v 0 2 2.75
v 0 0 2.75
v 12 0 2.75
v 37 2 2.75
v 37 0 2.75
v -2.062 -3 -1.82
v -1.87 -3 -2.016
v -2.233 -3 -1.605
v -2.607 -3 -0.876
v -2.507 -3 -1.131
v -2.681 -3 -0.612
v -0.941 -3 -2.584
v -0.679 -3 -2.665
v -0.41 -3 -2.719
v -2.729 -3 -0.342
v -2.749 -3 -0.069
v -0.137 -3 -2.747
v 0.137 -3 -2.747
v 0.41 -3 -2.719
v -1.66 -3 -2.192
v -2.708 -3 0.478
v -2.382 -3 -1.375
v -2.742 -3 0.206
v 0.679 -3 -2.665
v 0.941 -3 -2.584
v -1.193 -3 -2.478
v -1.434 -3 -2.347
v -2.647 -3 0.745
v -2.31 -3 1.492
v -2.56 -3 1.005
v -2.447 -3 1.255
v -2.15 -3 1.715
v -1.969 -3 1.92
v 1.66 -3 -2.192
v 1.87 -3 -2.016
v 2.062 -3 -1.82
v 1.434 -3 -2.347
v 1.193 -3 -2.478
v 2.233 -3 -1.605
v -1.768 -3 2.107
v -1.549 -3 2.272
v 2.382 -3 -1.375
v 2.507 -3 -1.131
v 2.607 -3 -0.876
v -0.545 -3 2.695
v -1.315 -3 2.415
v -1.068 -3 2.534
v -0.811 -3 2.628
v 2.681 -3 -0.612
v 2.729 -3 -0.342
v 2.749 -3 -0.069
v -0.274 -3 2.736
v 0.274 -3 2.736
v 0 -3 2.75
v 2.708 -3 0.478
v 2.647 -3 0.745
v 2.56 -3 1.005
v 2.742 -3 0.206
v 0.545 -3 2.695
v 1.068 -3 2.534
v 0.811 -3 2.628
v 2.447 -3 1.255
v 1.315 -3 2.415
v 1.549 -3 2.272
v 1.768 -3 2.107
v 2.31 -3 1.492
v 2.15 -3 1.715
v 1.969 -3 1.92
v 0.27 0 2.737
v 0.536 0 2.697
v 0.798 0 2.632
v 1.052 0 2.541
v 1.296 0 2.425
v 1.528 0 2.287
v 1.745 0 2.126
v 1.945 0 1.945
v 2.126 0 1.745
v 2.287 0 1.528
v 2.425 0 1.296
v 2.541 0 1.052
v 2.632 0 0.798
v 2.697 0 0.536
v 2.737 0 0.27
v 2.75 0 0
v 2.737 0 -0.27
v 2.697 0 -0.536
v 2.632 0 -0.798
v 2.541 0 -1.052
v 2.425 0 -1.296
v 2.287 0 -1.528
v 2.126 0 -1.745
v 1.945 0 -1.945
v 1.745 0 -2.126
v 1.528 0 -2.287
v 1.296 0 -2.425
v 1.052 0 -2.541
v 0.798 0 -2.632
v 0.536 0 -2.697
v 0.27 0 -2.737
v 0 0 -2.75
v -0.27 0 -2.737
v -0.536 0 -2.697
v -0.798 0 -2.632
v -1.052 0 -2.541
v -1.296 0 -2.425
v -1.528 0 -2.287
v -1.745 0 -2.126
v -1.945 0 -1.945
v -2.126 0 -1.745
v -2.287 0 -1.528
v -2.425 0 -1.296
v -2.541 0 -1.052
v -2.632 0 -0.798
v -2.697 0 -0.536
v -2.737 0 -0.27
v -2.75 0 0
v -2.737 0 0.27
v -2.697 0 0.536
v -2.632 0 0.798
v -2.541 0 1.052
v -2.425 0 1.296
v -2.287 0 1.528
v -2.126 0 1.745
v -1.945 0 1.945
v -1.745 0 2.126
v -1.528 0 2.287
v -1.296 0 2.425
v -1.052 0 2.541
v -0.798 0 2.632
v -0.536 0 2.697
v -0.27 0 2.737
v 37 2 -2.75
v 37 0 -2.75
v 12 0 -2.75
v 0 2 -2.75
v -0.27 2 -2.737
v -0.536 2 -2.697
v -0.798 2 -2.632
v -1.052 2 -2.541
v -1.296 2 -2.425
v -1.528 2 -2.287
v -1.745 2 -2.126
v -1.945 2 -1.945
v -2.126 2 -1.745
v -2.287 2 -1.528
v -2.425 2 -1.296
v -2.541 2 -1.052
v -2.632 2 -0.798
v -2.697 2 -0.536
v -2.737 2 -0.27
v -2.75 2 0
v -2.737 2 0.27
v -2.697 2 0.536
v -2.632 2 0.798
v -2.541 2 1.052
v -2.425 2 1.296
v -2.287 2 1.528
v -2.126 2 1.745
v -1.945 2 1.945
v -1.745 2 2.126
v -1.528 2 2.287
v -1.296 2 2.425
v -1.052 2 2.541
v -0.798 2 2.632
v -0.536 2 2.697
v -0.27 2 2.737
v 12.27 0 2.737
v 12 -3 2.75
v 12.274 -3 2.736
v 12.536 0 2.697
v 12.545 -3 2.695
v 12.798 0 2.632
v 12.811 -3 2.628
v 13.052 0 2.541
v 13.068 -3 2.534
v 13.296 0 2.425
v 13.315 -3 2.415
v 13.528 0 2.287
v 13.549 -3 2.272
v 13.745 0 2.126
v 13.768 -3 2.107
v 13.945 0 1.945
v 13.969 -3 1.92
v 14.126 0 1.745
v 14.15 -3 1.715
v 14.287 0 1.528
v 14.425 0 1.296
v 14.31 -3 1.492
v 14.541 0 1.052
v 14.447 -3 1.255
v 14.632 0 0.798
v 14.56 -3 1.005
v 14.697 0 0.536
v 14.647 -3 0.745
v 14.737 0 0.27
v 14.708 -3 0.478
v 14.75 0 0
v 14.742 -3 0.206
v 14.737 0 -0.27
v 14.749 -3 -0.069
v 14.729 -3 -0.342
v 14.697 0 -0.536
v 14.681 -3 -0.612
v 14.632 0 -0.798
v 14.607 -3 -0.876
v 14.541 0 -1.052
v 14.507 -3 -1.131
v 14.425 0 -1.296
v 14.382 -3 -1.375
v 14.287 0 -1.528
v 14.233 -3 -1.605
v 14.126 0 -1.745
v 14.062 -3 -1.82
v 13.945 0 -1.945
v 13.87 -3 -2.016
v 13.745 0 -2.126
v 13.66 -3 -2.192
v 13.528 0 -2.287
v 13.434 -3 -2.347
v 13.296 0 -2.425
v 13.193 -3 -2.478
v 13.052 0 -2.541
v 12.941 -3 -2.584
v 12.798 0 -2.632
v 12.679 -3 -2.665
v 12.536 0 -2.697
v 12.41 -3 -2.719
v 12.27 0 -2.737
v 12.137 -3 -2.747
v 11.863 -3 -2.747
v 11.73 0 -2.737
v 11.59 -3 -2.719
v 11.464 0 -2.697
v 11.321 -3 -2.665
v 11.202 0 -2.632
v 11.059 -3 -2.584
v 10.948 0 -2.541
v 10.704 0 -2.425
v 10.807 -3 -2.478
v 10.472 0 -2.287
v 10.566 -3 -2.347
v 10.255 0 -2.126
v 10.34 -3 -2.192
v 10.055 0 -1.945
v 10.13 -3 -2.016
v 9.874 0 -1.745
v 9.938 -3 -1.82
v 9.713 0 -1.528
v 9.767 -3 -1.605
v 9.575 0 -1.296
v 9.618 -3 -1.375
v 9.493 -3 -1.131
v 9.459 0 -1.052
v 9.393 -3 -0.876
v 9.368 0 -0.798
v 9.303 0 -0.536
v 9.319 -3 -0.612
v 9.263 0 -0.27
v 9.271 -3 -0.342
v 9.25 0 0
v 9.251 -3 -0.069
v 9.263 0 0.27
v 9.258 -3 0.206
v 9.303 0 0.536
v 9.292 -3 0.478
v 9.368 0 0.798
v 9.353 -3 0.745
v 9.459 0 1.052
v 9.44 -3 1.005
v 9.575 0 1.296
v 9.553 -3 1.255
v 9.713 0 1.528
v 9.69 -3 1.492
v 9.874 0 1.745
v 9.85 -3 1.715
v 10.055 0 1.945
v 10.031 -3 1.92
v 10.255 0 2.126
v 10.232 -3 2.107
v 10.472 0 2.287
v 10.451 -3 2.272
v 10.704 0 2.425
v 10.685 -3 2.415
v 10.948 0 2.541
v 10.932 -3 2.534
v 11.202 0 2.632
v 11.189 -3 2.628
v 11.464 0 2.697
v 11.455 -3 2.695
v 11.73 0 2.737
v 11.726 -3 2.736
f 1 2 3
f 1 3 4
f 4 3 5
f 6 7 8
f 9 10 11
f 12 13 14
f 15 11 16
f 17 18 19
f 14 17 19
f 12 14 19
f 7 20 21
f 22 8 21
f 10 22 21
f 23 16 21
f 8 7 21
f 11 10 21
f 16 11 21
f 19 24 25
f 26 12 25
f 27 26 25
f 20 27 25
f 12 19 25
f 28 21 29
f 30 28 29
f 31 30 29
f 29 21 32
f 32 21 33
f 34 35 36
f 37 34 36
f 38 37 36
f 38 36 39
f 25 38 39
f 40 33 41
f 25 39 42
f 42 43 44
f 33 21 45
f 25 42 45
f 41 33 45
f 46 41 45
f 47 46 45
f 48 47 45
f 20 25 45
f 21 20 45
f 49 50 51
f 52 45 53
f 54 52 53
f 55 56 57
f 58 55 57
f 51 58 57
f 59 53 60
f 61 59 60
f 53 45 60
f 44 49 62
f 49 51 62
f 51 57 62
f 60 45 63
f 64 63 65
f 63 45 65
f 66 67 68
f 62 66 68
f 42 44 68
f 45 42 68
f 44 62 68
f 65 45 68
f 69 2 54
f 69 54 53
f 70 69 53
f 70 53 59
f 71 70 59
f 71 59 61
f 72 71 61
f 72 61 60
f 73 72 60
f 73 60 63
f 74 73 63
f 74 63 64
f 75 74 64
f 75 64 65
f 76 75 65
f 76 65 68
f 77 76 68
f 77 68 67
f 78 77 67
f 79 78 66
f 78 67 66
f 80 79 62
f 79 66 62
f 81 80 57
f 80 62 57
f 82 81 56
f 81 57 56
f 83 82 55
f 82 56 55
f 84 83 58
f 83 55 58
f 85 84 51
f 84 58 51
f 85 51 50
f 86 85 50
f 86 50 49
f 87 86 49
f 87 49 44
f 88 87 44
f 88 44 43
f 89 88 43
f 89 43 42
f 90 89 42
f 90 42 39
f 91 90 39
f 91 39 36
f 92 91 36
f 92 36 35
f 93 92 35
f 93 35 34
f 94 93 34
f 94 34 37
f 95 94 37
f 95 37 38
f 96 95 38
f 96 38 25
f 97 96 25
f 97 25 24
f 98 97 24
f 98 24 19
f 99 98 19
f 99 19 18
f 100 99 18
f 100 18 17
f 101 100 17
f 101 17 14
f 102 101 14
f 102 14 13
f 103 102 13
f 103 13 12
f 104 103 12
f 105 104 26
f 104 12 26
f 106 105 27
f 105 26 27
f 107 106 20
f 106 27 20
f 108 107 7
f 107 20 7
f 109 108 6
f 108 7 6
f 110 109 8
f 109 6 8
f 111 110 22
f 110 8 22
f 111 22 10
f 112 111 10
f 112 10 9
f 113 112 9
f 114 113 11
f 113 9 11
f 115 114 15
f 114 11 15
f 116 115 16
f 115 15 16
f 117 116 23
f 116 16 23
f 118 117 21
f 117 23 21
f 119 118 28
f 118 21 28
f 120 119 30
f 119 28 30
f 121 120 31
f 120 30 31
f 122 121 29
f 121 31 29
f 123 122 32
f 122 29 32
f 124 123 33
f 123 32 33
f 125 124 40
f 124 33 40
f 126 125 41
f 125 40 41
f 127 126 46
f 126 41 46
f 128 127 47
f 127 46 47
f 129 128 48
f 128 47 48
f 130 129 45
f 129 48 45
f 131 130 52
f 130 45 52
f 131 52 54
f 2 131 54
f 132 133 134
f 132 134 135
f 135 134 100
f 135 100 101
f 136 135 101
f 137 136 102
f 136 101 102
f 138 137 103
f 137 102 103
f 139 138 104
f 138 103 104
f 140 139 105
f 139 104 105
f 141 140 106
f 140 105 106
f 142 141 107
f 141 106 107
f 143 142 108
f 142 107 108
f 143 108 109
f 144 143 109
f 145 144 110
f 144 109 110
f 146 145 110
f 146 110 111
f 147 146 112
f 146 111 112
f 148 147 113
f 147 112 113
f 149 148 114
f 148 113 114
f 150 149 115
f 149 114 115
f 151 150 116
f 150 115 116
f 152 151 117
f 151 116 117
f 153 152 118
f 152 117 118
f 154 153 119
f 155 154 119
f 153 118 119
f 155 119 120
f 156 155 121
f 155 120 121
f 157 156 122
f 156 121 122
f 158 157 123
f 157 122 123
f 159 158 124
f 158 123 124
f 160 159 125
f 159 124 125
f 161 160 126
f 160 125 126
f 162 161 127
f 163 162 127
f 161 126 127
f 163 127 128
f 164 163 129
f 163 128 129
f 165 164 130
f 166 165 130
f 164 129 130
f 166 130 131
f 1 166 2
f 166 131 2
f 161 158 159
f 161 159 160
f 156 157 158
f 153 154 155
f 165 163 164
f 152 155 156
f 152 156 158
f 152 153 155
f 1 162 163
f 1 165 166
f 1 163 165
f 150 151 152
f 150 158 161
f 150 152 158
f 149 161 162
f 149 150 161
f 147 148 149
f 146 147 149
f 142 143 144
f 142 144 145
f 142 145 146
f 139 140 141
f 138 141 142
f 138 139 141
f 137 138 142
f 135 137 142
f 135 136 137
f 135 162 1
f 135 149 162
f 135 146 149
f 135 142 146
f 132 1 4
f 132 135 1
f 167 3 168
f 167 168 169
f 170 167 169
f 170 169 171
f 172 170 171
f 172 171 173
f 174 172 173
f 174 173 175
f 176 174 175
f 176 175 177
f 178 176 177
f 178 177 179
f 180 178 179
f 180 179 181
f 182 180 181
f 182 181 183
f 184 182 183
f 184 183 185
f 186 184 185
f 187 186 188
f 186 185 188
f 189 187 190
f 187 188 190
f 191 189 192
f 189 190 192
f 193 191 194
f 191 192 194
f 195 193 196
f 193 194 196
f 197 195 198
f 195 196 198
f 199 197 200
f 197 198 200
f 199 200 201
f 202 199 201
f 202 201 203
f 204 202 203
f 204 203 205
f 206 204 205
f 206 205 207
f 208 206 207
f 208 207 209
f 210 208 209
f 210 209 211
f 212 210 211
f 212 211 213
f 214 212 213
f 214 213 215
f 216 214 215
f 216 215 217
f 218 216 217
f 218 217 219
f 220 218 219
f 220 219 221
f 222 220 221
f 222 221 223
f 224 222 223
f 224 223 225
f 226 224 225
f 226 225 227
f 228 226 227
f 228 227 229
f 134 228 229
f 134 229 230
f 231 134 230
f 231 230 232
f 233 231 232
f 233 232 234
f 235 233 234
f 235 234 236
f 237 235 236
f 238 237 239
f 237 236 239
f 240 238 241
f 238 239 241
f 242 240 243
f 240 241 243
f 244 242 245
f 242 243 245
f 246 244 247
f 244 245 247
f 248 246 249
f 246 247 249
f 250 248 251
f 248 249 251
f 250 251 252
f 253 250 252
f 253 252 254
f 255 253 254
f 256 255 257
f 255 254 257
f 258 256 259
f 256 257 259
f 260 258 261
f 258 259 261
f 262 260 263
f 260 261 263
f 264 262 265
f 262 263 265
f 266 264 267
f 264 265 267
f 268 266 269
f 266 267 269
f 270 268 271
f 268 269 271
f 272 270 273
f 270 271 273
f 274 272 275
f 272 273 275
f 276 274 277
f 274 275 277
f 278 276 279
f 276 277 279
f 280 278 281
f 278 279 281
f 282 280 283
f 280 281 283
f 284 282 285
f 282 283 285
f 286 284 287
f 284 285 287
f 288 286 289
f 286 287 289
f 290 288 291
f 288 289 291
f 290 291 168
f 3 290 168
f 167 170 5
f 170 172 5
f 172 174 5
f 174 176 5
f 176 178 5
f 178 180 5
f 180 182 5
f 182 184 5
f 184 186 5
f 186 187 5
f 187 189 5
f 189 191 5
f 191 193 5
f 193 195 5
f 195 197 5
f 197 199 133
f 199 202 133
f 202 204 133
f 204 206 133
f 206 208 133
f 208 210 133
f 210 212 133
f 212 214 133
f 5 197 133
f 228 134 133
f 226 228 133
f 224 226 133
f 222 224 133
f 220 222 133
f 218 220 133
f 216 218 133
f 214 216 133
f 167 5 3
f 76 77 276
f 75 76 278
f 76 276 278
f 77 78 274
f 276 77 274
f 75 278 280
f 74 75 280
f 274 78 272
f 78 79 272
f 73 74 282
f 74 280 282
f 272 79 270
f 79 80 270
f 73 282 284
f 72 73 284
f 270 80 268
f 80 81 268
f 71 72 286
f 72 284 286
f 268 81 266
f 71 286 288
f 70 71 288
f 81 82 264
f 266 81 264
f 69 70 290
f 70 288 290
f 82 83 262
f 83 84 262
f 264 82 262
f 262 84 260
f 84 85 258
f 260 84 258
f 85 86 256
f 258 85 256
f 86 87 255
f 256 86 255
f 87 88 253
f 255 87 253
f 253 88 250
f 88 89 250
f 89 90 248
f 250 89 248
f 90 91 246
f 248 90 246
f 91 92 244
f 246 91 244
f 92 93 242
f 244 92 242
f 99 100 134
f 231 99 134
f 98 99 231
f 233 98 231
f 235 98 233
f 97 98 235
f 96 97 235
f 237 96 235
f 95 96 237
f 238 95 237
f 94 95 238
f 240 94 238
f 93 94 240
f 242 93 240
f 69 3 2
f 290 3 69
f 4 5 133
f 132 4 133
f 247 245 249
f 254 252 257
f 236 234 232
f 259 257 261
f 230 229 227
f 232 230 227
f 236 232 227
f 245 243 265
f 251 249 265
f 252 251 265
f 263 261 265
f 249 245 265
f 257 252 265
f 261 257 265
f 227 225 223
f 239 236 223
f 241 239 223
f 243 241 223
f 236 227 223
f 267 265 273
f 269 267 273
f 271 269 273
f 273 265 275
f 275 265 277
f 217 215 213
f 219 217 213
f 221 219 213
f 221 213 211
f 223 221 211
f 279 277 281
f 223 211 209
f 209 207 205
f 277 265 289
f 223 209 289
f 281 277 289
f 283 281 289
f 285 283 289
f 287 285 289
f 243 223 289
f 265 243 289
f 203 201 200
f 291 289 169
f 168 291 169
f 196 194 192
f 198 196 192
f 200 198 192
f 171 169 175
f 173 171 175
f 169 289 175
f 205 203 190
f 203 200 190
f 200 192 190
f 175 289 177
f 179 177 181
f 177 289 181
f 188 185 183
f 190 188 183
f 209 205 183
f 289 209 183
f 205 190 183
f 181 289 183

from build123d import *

# Parameters (mm, degrees)
BOSS_EXTRUDE1_DEPTH = 2
BOSS_EXTRUDE2_START = -3
SKETCH1_3_R         = 2.75
BOSS_EXTRUDE2_DEPTH = 3


with BuildPart() as part:
    # Sketch1 → Boss-Extrude1 (new body)
    with BuildSketch(Plane(origin=(0, 0, 0), x_dir=(1, 0, 0), z_dir=(0, 1, 0))):
        with BuildLine():
            Line((37, 2.75), (0, 2.75))
            ThreePointArc((0, 2.75), (-2.75, 0), (0, -2.75))
            Line((0, -2.75), (37, -2.75))
            Line((37, -2.75), (37, 2.75))
        make_face()
    extrude(amount=BOSS_EXTRUDE1_DEPTH)

    # Sketch1<3> → Boss-Extrude2 (add)
    with BuildSketch(Plane(origin=(0, 0, 0), x_dir=(1, 0, 0), z_dir=(0, 1, 0)).offset(BOSS_EXTRUDE2_START)):
        with Locations((12, 0)):
            Circle(SKETCH1_3_R)
        Circle(SKETCH1_3_R)
    extrude(amount=BOSS_EXTRUDE2_DEPTH)


solid = part.part
